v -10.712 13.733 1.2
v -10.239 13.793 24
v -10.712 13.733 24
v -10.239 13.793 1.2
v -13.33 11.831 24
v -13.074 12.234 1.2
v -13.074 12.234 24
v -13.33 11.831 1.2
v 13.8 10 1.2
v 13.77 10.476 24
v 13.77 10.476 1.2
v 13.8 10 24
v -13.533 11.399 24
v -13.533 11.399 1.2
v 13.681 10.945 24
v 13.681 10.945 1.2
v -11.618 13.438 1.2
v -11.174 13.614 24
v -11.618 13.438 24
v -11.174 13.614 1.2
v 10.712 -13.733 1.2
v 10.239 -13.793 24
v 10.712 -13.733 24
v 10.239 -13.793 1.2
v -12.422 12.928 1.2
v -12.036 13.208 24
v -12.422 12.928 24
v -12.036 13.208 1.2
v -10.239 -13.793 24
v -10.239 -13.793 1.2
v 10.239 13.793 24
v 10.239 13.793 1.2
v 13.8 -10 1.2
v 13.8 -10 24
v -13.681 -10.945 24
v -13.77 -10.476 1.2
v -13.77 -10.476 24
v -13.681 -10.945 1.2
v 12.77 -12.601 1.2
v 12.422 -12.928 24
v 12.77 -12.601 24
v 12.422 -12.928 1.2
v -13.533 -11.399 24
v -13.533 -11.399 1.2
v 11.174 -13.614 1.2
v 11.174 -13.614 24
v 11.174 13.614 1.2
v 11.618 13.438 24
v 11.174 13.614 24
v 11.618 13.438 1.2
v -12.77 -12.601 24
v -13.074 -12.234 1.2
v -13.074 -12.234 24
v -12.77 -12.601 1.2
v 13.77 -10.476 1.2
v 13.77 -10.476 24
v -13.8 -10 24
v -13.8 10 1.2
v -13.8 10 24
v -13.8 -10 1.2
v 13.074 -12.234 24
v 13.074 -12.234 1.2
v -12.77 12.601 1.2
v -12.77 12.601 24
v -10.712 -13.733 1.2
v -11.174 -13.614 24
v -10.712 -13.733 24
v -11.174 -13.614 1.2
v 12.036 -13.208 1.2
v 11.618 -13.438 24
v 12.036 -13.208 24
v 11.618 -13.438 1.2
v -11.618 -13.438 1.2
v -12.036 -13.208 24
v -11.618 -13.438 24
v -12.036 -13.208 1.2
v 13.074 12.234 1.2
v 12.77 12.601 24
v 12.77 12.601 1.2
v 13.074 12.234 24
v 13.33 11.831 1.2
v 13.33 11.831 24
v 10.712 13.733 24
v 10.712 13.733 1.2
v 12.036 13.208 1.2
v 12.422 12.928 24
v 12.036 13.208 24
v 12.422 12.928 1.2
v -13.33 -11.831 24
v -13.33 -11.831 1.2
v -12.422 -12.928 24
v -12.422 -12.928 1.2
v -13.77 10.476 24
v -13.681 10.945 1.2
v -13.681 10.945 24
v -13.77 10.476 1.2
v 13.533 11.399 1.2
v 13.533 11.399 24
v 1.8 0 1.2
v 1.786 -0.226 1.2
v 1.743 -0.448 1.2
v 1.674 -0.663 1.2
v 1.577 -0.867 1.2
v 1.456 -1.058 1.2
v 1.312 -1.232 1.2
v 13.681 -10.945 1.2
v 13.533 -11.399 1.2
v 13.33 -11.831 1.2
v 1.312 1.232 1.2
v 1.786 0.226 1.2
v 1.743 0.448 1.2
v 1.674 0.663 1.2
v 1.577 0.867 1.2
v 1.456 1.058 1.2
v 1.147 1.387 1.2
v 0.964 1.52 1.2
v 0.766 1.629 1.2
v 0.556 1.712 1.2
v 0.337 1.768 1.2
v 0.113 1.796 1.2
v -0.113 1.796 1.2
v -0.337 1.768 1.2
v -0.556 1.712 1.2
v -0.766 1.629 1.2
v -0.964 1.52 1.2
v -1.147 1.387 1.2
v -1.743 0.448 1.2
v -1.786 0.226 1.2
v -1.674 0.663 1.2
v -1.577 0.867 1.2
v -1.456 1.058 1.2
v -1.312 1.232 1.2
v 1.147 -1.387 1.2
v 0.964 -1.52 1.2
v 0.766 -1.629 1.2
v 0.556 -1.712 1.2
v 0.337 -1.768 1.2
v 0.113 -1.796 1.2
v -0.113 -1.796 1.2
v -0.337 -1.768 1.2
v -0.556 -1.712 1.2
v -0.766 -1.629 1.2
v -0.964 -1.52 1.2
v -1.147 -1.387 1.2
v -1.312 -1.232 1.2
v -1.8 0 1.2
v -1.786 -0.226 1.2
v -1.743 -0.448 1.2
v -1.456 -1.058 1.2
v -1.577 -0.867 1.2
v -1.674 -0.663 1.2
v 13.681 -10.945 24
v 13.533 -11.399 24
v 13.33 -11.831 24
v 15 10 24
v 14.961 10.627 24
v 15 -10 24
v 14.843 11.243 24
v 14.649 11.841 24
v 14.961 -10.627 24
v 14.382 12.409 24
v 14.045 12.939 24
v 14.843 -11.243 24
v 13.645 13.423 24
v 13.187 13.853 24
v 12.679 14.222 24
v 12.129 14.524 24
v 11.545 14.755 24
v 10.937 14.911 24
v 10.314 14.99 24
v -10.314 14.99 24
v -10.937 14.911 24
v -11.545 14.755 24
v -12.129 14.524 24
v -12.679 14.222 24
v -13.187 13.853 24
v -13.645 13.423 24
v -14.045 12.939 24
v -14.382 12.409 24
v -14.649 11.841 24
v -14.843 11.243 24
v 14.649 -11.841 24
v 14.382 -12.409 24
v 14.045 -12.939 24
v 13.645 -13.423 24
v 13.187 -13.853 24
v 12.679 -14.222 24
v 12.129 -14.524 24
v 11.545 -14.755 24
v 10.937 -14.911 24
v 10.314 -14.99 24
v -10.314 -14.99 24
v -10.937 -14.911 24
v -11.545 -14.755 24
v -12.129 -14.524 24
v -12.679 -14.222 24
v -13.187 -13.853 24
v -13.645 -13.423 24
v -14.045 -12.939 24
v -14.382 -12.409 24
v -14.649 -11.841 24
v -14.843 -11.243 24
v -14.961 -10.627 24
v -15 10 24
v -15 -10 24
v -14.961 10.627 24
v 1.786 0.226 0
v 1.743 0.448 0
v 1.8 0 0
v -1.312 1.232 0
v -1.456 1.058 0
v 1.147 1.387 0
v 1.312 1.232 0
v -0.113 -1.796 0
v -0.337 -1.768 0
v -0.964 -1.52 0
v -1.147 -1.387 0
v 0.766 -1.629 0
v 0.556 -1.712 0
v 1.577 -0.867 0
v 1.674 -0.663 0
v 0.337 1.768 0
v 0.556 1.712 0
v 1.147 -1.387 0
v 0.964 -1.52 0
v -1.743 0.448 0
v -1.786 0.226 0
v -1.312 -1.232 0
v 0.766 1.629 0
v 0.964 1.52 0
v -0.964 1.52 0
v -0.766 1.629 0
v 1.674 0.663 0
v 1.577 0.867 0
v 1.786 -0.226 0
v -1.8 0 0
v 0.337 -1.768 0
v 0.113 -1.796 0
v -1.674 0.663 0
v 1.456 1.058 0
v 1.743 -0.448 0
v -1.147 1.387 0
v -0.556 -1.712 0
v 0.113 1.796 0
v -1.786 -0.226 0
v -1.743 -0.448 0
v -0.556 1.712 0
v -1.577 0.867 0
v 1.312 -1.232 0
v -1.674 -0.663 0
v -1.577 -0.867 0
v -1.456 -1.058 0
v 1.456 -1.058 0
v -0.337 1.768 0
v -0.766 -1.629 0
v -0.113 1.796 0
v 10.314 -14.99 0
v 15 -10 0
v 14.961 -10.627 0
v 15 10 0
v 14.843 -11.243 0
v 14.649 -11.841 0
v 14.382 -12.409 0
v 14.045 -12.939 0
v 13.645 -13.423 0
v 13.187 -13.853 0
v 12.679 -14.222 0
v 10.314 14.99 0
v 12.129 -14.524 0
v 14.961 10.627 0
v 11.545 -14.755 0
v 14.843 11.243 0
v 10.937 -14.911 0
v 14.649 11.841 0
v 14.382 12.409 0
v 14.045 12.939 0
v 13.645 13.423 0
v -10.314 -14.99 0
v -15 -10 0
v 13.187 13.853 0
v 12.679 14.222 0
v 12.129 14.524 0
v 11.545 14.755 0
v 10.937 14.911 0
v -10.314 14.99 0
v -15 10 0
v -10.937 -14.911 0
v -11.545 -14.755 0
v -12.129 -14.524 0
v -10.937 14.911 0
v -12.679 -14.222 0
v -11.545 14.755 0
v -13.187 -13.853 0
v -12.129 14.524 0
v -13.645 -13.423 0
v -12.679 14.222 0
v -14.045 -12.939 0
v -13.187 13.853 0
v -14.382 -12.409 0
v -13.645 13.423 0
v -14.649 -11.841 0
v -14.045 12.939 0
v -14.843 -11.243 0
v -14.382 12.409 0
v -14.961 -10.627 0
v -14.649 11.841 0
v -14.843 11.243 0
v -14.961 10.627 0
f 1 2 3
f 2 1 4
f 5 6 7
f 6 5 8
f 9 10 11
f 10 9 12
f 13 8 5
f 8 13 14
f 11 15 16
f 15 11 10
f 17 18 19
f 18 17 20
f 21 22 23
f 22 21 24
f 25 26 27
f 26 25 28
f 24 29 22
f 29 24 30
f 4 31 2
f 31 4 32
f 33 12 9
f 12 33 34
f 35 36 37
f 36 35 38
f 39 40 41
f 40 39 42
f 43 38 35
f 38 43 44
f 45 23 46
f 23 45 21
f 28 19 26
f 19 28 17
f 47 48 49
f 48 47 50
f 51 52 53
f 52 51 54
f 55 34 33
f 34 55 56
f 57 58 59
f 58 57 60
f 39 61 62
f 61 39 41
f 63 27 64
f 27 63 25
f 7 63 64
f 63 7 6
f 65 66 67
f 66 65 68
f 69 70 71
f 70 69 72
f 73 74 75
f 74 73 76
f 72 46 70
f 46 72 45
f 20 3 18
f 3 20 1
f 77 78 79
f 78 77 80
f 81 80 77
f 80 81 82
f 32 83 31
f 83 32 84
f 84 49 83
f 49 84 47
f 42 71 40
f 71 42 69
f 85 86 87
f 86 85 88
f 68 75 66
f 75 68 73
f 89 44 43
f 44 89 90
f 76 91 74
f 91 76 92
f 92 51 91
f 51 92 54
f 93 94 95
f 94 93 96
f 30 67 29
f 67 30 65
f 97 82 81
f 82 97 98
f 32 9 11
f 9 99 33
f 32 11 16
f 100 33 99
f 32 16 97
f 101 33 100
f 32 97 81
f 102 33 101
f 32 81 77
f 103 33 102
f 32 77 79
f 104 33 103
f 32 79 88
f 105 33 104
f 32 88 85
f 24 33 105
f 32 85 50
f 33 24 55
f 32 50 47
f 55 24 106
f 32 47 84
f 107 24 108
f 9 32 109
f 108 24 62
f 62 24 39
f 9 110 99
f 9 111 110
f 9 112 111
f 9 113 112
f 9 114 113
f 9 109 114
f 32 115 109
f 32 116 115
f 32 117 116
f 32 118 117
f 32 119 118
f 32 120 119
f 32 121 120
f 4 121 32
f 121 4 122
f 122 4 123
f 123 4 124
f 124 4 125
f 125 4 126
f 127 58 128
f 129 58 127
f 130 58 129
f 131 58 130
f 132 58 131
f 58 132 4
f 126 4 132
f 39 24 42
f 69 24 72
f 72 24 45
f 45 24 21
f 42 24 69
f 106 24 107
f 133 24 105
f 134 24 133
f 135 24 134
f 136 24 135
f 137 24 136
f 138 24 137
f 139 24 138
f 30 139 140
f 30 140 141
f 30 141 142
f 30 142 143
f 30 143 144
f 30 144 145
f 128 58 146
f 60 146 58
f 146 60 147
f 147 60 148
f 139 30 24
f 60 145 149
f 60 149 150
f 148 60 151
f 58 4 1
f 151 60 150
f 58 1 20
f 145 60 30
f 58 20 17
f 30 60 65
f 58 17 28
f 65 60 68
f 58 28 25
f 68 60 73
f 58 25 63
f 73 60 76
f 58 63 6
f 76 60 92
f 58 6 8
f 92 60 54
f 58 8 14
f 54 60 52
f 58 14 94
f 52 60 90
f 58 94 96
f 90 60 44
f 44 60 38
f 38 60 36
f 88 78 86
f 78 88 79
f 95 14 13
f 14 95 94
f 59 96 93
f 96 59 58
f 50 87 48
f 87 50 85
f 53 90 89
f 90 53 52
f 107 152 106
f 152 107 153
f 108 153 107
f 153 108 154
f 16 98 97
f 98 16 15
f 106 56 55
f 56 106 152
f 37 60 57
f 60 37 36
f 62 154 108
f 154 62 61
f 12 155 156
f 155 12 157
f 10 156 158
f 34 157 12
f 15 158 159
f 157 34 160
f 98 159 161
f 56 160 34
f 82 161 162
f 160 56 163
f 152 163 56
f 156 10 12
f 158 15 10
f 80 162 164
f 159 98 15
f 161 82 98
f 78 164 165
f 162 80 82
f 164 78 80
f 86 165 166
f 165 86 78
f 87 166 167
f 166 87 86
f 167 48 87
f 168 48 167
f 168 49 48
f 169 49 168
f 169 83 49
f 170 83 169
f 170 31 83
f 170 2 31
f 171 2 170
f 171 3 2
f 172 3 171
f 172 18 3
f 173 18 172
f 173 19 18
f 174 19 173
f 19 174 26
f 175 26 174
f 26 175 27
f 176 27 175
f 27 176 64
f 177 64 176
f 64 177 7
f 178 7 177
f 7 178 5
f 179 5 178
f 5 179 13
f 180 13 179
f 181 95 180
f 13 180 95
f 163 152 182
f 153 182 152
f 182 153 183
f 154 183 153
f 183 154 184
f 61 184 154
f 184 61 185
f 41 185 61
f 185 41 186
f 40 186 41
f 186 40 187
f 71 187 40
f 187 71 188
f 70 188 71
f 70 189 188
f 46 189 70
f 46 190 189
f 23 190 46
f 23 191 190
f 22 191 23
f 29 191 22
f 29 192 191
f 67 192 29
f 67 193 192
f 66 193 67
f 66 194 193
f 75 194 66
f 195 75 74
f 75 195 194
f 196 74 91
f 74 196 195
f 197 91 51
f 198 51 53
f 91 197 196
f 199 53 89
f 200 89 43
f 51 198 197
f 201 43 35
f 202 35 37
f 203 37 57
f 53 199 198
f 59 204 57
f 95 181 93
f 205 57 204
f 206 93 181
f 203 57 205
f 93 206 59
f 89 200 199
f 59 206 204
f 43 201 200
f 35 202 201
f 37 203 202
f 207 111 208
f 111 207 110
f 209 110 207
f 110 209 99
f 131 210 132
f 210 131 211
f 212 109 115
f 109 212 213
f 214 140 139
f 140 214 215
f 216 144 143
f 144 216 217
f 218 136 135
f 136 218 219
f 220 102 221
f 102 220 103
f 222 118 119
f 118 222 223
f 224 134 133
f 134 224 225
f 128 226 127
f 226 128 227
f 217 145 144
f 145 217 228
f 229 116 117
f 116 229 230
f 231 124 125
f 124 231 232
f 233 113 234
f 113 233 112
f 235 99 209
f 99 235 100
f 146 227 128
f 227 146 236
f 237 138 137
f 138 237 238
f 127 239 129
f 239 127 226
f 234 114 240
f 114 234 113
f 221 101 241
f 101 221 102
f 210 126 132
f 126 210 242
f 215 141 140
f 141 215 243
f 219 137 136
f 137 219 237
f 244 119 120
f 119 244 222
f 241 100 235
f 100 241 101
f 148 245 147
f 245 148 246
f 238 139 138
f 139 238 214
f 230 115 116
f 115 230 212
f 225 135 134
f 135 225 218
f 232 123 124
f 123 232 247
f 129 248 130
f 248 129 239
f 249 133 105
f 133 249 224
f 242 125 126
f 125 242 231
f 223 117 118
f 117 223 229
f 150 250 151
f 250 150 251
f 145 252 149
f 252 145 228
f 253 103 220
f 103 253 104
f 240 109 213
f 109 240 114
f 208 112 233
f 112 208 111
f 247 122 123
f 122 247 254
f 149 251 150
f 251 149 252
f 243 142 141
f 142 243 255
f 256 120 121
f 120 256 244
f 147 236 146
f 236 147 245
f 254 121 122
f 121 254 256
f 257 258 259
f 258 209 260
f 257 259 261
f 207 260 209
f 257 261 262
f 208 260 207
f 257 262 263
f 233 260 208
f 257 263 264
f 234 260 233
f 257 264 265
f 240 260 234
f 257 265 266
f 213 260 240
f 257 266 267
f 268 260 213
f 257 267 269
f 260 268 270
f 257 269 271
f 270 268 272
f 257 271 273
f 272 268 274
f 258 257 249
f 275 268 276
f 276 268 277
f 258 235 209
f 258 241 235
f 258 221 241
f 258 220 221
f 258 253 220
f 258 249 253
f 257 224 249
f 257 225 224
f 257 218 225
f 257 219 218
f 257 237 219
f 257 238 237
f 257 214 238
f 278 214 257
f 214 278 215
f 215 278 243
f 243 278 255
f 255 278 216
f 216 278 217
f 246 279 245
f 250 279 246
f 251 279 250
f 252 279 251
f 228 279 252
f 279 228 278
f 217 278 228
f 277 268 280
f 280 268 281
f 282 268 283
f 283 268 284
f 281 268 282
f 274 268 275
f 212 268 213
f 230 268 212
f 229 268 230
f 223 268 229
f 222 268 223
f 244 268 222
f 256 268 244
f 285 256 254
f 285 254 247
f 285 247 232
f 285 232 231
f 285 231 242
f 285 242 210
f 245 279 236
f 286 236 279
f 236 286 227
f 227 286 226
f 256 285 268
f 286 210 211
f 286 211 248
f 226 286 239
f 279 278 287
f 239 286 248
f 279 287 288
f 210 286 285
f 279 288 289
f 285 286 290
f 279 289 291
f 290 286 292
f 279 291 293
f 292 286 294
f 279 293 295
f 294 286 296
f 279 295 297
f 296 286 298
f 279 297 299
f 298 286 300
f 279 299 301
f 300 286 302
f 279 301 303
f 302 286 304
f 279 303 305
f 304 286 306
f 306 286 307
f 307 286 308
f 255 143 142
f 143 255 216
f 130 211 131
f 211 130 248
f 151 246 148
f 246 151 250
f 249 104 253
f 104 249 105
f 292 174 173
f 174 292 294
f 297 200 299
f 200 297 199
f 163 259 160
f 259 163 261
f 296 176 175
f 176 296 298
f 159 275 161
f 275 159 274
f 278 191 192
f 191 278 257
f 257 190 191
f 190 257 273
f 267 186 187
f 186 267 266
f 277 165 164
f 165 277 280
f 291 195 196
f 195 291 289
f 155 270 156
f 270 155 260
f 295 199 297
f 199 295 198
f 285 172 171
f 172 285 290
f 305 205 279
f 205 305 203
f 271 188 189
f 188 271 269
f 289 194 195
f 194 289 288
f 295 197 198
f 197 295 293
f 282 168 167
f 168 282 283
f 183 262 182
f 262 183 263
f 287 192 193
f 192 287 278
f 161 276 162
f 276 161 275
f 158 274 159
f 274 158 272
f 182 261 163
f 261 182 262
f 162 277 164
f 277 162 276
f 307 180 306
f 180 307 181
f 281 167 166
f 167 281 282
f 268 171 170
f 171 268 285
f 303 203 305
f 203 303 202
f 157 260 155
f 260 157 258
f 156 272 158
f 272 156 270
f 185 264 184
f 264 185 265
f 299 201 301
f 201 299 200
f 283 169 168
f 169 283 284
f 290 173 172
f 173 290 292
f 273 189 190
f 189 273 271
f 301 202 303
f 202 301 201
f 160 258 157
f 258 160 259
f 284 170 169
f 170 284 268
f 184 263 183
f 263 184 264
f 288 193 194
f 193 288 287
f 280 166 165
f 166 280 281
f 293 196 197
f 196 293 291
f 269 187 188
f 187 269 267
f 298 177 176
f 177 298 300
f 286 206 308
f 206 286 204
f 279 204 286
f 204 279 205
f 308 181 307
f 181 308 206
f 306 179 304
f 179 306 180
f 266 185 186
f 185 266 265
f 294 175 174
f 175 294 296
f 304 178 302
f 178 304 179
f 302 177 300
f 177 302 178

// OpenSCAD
$fn = 50;


difference() {
	union() {
		hull() {
			translate(v = [-10.0000000000, 10.0000000000, 0]) {
				cylinder(h = 24, r = 5);
			}
			translate(v = [10.0000000000, 10.0000000000, 0]) {
				cylinder(h = 24, r = 5);
			}
			translate(v = [-10.0000000000, -10.0000000000, 0]) {
				cylinder(h = 24, r = 5);
			}
			translate(v = [10.0000000000, -10.0000000000, 0]) {
				cylinder(h = 24, r = 5);
			}
		}
	}
	union() {
		translate(v = [0, 0, 1.2000000000]) {
			hull() {
				translate(v = [-10.0000000000, 10.0000000000, 0]) {
					cylinder(h = 22.8000000000, r = 3.8000000000);
				}
				translate(v = [10.0000000000, 10.0000000000, 0]) {
					cylinder(h = 22.8000000000, r = 3.8000000000);
				}
				translate(v = [-10.0000000000, -10.0000000000, 0]) {
					cylinder(h = 22.8000000000, r = 3.8000000000);
				}
				translate(v = [10.0000000000, -10.0000000000, 0]) {
					cylinder(h = 22.8000000000, r = 3.8000000000);
				}
			}
		}
		#cylinder(h = 1.2000000000, r = 1.8000000000);
	}
}
